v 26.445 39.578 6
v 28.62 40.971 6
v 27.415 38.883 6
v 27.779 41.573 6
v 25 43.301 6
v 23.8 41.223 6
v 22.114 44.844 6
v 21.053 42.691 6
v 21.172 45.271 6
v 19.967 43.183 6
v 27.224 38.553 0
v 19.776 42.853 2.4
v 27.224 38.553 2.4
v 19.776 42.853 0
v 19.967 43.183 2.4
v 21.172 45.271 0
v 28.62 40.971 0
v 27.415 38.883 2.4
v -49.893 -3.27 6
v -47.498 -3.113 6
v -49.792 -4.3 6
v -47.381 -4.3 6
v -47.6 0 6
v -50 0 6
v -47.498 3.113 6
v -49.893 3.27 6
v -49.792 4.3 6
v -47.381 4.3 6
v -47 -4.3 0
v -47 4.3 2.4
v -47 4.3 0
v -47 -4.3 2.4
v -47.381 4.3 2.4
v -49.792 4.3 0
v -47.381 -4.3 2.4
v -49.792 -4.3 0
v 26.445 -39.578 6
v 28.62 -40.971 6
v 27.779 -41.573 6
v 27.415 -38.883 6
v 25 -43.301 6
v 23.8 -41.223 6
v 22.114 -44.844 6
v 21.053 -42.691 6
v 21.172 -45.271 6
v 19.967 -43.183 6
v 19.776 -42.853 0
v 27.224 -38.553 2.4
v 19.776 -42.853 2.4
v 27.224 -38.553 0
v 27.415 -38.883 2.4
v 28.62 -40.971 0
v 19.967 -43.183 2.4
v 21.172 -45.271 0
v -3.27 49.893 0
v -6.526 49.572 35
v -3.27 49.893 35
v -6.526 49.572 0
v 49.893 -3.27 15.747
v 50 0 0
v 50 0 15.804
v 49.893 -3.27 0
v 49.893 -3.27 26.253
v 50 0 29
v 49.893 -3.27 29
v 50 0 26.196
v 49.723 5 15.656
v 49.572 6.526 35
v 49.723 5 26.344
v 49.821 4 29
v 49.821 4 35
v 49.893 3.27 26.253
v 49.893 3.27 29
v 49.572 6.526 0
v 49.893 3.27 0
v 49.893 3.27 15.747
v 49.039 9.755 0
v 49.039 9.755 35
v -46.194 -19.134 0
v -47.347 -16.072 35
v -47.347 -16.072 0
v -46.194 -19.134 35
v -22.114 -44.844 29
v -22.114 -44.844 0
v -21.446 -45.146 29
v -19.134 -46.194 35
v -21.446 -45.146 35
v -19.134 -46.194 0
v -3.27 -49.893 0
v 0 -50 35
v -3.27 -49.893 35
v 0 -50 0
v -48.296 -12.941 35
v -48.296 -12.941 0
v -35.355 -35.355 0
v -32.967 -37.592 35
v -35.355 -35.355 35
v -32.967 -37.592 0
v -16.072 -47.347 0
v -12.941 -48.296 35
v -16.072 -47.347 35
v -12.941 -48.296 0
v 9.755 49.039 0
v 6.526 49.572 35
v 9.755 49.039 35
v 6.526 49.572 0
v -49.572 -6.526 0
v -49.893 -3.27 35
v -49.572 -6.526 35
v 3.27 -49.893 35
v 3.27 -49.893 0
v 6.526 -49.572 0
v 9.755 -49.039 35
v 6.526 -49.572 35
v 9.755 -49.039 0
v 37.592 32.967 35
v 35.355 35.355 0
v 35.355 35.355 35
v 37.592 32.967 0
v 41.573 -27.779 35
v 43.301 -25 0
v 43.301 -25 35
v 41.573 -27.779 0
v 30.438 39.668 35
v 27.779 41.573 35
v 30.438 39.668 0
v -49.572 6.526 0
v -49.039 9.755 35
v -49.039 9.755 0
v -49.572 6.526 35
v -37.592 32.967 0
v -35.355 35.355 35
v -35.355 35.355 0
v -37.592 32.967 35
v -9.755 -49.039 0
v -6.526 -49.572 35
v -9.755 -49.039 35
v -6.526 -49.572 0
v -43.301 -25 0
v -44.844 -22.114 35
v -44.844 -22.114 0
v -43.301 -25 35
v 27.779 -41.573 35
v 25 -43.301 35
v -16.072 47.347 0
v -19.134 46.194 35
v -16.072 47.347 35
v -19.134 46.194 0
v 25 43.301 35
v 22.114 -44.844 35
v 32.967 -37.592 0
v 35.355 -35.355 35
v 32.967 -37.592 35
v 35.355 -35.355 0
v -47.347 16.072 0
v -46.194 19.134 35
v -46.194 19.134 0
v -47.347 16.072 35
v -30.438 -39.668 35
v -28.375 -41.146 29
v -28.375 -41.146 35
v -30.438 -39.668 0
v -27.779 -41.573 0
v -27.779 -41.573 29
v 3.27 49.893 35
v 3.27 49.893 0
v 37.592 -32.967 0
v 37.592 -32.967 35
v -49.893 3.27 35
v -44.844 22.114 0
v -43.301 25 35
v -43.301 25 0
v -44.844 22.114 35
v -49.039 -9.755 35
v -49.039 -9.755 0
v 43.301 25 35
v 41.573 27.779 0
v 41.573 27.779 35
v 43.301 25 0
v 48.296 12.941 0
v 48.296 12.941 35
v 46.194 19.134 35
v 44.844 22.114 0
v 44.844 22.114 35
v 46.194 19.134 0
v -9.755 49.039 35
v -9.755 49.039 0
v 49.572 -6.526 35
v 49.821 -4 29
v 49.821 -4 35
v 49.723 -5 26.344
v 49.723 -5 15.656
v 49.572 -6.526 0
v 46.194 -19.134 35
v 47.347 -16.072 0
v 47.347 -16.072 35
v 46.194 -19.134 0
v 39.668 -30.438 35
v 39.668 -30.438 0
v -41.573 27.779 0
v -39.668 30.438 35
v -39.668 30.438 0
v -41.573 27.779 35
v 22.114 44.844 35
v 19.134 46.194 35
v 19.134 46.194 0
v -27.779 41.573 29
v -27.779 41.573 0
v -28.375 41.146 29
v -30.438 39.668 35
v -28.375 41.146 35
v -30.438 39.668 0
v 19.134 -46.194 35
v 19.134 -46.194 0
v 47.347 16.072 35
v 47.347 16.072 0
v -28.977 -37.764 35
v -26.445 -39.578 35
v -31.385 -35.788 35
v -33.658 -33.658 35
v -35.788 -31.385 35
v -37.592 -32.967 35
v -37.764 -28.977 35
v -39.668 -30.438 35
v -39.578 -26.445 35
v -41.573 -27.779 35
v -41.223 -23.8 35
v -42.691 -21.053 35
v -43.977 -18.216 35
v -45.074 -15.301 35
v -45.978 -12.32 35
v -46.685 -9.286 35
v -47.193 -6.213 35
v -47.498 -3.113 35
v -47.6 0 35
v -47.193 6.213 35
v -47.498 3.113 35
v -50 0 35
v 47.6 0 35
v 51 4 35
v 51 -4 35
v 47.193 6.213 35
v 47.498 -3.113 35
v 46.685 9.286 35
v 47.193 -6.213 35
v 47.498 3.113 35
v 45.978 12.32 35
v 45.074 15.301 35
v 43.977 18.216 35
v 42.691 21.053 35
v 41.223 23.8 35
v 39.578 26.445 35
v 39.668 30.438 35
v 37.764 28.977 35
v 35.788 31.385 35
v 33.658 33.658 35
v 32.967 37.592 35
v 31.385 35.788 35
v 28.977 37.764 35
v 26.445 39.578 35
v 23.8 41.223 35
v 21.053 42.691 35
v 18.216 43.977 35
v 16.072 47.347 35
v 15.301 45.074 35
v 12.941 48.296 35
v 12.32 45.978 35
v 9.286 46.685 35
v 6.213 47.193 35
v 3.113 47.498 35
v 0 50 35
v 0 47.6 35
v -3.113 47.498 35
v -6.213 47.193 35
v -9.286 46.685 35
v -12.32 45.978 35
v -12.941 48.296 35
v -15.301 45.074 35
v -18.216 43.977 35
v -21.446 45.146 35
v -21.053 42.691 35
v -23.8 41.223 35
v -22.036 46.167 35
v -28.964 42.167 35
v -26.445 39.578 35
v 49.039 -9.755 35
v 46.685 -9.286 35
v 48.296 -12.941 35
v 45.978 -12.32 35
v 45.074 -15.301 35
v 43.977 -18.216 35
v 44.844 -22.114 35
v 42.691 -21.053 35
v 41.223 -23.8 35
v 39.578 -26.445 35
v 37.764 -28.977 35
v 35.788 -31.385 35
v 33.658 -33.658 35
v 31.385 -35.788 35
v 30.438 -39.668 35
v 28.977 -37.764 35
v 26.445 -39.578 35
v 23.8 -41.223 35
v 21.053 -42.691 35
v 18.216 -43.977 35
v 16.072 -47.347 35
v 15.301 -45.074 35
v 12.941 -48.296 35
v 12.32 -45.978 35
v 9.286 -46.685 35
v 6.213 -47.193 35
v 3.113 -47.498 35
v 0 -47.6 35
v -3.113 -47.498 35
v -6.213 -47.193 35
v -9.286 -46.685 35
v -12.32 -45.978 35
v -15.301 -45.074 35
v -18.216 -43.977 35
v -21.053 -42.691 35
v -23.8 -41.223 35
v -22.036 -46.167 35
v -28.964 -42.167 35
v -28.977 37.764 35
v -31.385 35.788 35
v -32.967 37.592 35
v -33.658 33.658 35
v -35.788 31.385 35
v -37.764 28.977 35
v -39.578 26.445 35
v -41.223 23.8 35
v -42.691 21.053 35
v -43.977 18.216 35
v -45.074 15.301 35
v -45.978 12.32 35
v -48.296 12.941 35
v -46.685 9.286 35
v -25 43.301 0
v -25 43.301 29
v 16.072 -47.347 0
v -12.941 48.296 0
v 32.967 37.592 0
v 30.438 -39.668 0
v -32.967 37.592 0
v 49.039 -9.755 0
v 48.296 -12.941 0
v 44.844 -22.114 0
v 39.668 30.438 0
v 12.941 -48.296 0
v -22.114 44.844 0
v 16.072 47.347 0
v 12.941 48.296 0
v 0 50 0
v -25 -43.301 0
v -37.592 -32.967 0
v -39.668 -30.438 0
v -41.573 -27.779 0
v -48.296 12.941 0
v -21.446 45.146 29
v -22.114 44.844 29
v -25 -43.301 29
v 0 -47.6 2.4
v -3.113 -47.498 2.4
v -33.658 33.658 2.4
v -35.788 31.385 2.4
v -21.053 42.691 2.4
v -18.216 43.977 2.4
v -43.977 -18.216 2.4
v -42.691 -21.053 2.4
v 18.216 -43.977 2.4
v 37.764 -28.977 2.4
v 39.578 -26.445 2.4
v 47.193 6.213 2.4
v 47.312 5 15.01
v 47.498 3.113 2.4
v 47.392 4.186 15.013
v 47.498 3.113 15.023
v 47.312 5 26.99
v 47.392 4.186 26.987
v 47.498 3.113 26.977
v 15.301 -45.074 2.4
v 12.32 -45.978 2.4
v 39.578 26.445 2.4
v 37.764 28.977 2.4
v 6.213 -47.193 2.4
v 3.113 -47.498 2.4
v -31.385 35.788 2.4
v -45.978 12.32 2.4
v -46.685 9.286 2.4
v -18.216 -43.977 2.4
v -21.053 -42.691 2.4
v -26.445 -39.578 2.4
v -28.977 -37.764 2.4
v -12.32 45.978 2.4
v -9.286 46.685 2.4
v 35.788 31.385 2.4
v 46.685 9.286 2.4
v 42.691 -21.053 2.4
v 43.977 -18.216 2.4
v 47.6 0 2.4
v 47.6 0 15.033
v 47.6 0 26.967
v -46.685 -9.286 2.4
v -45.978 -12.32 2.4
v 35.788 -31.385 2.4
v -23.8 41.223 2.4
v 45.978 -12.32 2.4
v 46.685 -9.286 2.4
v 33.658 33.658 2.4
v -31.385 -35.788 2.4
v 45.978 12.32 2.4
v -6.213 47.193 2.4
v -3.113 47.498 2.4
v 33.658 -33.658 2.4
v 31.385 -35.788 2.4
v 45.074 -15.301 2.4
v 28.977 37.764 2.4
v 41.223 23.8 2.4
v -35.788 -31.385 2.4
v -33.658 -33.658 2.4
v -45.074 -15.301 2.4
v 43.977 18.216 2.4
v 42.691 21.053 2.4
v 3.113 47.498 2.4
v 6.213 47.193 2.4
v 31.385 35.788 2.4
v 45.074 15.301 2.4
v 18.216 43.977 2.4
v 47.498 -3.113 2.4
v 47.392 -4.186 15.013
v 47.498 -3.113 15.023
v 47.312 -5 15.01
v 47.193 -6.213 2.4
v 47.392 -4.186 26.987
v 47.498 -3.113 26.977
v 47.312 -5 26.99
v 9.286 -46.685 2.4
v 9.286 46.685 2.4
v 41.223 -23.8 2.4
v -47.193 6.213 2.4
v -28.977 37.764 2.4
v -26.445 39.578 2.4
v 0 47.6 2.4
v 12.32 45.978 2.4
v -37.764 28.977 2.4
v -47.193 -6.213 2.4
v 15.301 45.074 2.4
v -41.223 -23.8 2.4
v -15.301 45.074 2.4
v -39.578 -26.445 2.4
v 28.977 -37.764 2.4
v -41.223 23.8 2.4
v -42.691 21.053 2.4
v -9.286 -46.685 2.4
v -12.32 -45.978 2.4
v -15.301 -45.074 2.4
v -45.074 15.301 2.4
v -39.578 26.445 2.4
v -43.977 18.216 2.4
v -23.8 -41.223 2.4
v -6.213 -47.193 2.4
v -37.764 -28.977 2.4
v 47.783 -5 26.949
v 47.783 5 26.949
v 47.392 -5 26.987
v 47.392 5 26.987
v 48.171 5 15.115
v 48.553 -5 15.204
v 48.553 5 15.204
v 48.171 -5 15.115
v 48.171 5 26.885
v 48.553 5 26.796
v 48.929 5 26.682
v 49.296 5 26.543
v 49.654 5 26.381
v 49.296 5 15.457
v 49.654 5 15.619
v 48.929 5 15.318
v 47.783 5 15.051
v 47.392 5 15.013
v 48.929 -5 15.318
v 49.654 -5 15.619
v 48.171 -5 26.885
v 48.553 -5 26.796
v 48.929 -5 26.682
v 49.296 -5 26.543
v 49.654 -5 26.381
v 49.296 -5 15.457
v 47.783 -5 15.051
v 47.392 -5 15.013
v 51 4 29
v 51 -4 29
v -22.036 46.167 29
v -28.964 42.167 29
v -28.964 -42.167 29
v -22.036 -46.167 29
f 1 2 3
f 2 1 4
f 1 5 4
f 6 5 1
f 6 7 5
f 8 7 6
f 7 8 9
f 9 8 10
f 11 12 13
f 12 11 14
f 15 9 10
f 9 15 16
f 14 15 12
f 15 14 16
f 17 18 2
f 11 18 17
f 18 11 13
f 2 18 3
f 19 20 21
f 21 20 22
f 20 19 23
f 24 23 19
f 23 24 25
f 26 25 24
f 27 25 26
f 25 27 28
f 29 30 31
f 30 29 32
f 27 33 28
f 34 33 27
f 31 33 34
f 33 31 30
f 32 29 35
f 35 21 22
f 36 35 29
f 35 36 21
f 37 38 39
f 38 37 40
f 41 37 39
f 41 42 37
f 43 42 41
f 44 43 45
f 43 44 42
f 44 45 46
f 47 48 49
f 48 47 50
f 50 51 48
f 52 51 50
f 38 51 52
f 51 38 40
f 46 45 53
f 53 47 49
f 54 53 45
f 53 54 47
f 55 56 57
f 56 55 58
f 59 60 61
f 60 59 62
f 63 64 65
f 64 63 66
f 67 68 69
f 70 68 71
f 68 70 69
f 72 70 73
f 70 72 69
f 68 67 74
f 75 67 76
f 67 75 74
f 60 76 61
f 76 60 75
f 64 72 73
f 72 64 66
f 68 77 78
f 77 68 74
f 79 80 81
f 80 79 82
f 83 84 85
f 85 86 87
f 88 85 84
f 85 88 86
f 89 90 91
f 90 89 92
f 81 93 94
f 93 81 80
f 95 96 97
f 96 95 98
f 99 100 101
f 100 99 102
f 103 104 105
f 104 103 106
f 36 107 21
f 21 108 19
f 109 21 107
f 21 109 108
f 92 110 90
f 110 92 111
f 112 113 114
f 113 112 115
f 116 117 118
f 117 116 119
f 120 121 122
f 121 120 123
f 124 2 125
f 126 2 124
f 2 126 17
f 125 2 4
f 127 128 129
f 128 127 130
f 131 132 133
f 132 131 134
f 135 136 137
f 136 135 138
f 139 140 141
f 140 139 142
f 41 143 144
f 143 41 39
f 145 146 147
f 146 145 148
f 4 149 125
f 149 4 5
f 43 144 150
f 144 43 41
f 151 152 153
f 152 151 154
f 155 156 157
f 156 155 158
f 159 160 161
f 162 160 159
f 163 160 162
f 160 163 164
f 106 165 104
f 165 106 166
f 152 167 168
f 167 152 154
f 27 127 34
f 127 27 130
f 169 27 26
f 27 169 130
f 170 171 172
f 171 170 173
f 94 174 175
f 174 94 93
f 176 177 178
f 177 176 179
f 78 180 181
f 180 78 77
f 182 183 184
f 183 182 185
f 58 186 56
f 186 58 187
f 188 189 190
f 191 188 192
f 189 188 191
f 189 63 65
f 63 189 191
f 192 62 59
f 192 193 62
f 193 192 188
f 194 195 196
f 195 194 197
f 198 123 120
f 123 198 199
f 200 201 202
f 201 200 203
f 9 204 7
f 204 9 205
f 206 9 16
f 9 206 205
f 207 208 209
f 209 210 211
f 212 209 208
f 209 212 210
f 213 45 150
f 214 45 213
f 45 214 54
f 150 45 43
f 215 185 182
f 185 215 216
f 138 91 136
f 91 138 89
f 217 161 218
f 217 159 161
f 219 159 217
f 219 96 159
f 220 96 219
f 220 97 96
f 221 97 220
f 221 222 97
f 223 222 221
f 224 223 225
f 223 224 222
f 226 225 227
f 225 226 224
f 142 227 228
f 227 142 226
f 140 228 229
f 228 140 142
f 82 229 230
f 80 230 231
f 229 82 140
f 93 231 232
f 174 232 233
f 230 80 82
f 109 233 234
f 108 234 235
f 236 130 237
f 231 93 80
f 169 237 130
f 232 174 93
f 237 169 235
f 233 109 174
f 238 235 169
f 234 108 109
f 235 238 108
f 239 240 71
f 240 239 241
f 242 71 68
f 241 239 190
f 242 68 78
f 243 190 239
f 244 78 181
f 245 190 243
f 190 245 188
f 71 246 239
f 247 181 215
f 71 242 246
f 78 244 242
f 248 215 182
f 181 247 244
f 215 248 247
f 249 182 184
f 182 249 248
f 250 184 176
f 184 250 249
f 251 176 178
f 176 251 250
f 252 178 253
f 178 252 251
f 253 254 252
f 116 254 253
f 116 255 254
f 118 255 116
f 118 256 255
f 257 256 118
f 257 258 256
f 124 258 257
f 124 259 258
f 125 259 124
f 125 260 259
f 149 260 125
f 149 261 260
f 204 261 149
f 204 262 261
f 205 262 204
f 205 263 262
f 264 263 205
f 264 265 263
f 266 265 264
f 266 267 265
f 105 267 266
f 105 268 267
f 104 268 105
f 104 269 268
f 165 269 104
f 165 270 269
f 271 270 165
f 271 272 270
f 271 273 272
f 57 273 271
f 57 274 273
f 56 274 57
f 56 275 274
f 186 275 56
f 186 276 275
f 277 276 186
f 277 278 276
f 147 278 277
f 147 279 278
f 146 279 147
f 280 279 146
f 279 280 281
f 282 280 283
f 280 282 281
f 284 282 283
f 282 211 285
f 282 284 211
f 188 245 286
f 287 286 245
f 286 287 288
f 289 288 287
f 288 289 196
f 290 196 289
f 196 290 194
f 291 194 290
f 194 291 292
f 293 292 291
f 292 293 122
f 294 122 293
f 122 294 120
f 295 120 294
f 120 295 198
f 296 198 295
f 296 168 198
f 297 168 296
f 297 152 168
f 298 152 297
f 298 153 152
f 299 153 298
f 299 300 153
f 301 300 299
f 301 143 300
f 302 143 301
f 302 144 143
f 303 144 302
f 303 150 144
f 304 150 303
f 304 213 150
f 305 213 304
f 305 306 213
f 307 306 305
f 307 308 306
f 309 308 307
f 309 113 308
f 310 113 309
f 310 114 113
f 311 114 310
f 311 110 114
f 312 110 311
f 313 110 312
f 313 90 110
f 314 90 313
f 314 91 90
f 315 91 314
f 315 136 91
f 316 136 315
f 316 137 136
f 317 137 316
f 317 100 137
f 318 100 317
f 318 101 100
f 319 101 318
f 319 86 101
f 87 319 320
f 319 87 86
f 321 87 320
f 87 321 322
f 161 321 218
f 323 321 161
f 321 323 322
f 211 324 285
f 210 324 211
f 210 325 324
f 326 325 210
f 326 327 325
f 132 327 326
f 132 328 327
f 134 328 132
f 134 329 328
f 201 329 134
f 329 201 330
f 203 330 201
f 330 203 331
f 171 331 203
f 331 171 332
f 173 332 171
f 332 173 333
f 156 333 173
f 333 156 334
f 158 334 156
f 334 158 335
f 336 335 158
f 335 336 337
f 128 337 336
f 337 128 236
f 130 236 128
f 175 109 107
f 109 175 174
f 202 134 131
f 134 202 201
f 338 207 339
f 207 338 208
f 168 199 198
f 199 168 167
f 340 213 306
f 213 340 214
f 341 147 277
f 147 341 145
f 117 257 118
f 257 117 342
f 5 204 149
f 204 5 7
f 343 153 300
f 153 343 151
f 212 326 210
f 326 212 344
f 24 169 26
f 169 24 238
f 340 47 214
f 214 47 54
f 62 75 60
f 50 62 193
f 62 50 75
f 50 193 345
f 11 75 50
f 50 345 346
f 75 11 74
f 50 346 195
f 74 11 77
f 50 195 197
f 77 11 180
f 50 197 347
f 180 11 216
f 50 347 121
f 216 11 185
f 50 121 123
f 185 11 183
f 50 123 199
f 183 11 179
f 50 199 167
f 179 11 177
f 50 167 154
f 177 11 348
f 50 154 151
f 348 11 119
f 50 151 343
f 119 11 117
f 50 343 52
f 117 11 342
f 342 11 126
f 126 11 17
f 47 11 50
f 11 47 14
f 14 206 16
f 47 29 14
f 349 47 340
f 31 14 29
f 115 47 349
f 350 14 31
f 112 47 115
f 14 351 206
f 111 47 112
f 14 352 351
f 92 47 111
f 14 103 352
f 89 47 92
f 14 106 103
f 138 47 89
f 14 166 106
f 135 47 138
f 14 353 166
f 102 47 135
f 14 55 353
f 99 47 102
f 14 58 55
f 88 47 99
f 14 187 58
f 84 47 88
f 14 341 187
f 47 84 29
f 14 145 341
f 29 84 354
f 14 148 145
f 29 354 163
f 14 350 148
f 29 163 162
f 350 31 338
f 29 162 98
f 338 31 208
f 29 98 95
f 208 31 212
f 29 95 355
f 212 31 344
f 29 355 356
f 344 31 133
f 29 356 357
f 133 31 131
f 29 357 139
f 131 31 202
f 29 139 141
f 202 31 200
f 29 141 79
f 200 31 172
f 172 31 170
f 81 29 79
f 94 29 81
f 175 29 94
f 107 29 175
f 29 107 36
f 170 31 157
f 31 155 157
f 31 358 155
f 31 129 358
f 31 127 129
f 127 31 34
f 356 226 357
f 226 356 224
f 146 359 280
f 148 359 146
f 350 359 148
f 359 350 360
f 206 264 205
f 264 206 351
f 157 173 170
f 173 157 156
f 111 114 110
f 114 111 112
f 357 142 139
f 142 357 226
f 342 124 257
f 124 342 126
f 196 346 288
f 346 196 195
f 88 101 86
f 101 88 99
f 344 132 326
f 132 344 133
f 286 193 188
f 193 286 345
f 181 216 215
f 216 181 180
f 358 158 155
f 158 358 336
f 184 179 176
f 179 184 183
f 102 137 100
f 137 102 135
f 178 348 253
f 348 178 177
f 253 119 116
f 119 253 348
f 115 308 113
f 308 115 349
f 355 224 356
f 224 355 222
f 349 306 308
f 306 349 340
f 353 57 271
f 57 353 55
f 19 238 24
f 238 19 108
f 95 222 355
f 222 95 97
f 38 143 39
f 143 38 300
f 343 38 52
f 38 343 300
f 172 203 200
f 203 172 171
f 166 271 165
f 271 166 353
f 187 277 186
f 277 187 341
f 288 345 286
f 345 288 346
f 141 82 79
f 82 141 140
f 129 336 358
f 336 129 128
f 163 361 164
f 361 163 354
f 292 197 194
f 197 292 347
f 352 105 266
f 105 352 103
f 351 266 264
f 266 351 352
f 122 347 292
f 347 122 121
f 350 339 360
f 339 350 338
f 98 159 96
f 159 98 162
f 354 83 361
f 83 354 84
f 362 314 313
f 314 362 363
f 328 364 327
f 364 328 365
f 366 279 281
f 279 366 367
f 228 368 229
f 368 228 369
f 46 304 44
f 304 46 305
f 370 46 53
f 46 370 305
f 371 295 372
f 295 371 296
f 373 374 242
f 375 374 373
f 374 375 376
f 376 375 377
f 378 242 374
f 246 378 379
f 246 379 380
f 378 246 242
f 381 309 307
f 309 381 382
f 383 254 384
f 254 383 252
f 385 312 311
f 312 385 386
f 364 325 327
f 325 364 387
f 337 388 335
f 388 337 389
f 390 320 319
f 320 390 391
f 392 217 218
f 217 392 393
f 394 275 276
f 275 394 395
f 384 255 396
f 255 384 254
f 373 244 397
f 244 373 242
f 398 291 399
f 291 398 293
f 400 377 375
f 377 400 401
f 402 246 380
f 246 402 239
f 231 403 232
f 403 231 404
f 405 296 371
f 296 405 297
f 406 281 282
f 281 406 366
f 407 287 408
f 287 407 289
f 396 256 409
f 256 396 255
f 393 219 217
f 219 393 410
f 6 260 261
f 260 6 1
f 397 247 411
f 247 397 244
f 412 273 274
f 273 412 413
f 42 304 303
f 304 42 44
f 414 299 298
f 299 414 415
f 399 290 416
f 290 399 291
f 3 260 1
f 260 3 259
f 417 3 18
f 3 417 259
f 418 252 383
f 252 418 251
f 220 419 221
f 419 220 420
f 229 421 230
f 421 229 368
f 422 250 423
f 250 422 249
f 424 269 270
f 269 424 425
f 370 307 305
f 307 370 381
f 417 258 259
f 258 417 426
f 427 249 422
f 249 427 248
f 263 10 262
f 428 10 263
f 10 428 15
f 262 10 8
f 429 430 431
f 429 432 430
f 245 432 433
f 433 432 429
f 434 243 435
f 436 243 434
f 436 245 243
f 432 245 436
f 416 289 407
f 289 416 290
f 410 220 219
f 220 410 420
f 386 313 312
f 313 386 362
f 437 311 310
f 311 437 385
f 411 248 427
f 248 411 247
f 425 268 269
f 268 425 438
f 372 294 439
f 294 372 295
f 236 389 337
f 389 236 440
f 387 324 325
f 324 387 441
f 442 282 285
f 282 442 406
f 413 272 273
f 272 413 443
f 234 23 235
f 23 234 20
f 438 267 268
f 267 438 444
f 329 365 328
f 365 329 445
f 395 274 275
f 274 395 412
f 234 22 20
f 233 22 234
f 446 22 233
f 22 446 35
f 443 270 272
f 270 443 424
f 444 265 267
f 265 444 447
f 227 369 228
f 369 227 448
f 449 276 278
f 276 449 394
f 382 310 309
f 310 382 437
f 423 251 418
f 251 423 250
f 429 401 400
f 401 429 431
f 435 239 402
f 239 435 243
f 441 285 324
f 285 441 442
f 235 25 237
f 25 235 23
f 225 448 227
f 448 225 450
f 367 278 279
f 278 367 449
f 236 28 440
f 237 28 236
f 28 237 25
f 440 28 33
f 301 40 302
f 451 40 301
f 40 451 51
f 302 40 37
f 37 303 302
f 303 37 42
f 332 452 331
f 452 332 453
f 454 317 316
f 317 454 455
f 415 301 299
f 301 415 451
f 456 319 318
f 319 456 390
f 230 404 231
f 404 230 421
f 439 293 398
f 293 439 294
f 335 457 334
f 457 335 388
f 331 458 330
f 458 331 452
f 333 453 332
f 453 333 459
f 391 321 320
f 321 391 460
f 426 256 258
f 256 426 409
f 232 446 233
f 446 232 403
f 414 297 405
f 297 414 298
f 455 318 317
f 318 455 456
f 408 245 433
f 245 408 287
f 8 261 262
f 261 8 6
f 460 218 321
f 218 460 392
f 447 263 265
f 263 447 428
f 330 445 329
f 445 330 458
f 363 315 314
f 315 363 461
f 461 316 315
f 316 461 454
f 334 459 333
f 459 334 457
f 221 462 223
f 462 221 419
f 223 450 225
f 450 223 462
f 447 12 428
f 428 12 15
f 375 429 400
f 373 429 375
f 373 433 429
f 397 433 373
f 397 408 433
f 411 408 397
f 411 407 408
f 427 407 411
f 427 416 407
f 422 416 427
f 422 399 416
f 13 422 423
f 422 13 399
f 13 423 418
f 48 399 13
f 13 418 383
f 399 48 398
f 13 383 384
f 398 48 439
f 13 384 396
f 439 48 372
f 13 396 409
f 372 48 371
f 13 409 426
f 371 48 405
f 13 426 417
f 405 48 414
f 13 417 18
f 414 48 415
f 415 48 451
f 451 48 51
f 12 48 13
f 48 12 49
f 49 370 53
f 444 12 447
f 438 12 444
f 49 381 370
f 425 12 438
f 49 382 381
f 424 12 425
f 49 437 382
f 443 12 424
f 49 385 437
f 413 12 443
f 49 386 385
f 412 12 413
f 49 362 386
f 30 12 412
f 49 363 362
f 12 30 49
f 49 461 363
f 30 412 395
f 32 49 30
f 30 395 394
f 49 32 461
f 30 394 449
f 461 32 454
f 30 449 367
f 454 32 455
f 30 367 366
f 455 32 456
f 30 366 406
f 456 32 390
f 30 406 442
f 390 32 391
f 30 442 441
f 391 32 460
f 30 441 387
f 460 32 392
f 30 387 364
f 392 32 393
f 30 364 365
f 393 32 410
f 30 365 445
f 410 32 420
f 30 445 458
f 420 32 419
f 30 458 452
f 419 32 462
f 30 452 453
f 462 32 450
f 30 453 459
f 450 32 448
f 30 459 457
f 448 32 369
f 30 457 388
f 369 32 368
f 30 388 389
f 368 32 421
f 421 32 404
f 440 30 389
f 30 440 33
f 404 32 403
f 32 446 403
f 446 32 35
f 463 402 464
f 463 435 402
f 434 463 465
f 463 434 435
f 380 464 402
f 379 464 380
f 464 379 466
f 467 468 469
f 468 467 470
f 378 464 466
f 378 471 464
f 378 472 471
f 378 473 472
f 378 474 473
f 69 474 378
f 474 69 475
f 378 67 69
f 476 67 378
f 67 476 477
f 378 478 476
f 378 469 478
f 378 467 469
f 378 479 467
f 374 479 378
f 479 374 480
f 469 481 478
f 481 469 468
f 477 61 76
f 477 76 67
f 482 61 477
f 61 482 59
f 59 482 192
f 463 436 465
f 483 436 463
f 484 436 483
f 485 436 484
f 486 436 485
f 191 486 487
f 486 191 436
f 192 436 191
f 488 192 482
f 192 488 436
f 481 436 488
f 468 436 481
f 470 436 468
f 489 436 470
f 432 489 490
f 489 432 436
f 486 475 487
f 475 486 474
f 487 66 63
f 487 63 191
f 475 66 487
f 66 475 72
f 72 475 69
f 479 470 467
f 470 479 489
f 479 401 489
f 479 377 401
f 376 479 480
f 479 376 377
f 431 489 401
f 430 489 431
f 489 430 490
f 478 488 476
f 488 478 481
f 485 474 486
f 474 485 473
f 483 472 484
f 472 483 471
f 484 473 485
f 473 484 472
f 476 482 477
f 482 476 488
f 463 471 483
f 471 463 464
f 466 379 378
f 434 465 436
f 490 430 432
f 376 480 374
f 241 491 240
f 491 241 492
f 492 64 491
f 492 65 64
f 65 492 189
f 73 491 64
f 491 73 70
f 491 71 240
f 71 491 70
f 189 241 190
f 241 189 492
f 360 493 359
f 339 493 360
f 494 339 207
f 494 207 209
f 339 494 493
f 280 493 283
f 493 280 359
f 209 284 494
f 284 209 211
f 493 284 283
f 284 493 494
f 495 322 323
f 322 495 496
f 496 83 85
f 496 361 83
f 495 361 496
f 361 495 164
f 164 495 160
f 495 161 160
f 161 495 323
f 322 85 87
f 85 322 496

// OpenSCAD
// ============================================================
// Modular Terrarium Base System — Parametric Model
// djinn-vault / 3d-printing / terrariums
//
// One system, variable dimensions. Change the parameters below
// per terrarium instead of redesigning from scratch.
//
// Render one part at a time: set PART below to 1, 2, or 3.
// ============================================================

// ---------- USER PARAMETERS (change per terrarium) ----------
outer_diameter   = 100;   // mm — match to container mouth diameter
shape            = "round"; // "round" | "hex" | "square"
shelf_height     = 25;    // Part 1 height
riser_height     = 25;    // Part 2 height
reservoir_height = 35;    // Part 3 height — increase for closed/moss builds
side_port        = true;  // add viewing port to Part 3
wall_thickness_thin = 1.2;  // Parts 1 & 2
wall_thickness_thick = 2.4; // Part 3 (must hold standing water)

PART = 3; // <-- set to 1, 2, or 3 before rendering/exporting

// ---------- FIXED SYSTEM SPEC (do not change per-project) ----------
lug_count   = 3;
lug_width   = 8;
lug_depth   = 2;
lug_angle_spacing = 360 / lug_count; // 120 deg
ring_height = 6;

$fn = 96;

// ---------- SHAPE HELPER ----------
module base_profile(d, h) {
    r = d / 2;
    if (shape == "round") {
        cylinder(d = d, h = h);
    } else if (shape == "hex") {
        cylinder(d = d, h = h, $fn = 6);
    } else if (shape == "square") {
        translate([-r, -r, 0]) cube([d, d, h]);
    }
}

// ---------- BAYONET RING (male lugs, printed on top of each part) ----------
module bayonet_lugs(d, z) {
    r = d / 2;
    for (i = [0 : lug_count - 1]) {
        rotate([0, 0, i * lug_angle_spacing])
            translate([r - lug_depth, -lug_width/2, z])
                cube([lug_depth + 1, lug_width, ring_height]);
    }
}

// ---------- BAYONET SLOT (female, cut into bottom of each part) ----------
module bayonet_slots(d, z) {
    r = d / 2;
    for (i = [0 : lug_count - 1]) {
        rotate([0, 0, i * lug_angle_spacing + (lug_angle_spacing/2)])
            translate([r - lug_depth - 1, -lug_width/2 - 0.3, z])
                cube([lug_depth + 2, lug_width + 0.6, ring_height + 0.5]);
    }
}

// ---------- PART 1: PLANTING SHELF ----------
module part1_shelf() {
    d = outer_diameter;
    difference() {
        base_profile(d, shelf_height);
        // hollow interior
        translate([0, 0, wall_thickness_thin])
            base_profile(d - 2*wall_thickness_thin, shelf_height);
        // bottom slots (female, mates to Part 2 lugs)
        bayonet_slots(d, -0.5);
        // radial drainage slots in floor
        for (i = [0:7]) {
            rotate([0, 0, i * 45])
                translate([0, 0, -0.5])
                    linear_extrude(height = wall_thickness_thin + 1)
                        translate([d*0.15, -2, 0])
                            square([d*0.3, 4]);
        }
    }
    // top lugs (male, mates to container ring)
    bayonet_lugs(d, shelf_height - ring_height);
}

// ---------- PART 2: PERFORATED RISER ----------
module part2_riser() {
    d = outer_diameter;
    difference() {
        base_profile(d, riser_height);
        translate([0, 0, wall_thickness_thin])
            base_profile(d - 2*wall_thickness_thin, riser_height);
        bayonet_slots(d, -0.5);
        // vertical channel perforations, aligned with Part 1 slot angles
        for (i = [0:7]) {
            rotate([0, 0, i * 45])
                translate([d*0.3, 0, riser_height/2])
                    cylinder(d = 6, h = riser_height + 1, center = true);
        }
    }
    bayonet_lugs(d, riser_height - ring_height);
}

// ---------- PART 3: WATER RESERVOIR ----------
module part3_reservoir() {
    d = outer_diameter;
    difference() {
        base_profile(d, reservoir_height);
        translate([0, 0, wall_thickness_thick])
            base_profile(d - 2*wall_thickness_thick, reservoir_height - wall_thickness_thick + 0.5);
        bayonet_slots(d, -0.5);
        if (side_port) {
            translate([d/2 - 3, 0, reservoir_height*0.6])
                rotate([90, 0, 0])
                    cylinder(d = 12, h = 10, center = true);
        }
    }
    bayonet_lugs(d, reservoir_height - ring_height);
}

// ---------- RENDER SELECTED PART ----------
if (PART == 1) part1_shelf();
else if (PART == 2) part2_riser();
else if (PART == 3) part3_reservoir();

// ============================================================
// NOTES:
// - Export each part as separate STL: render PART=1, export,
//   render PART=2, export, render PART=3, export.
// - Any part fits any other part's ring in this system — lug
//   spec is fixed regardless of outer_diameter or shape.
// - Print orientation: Parts 1 & 2 flat (floor down). Part 3
//   upright / vase mode if side_port = false.
// ============================================================
